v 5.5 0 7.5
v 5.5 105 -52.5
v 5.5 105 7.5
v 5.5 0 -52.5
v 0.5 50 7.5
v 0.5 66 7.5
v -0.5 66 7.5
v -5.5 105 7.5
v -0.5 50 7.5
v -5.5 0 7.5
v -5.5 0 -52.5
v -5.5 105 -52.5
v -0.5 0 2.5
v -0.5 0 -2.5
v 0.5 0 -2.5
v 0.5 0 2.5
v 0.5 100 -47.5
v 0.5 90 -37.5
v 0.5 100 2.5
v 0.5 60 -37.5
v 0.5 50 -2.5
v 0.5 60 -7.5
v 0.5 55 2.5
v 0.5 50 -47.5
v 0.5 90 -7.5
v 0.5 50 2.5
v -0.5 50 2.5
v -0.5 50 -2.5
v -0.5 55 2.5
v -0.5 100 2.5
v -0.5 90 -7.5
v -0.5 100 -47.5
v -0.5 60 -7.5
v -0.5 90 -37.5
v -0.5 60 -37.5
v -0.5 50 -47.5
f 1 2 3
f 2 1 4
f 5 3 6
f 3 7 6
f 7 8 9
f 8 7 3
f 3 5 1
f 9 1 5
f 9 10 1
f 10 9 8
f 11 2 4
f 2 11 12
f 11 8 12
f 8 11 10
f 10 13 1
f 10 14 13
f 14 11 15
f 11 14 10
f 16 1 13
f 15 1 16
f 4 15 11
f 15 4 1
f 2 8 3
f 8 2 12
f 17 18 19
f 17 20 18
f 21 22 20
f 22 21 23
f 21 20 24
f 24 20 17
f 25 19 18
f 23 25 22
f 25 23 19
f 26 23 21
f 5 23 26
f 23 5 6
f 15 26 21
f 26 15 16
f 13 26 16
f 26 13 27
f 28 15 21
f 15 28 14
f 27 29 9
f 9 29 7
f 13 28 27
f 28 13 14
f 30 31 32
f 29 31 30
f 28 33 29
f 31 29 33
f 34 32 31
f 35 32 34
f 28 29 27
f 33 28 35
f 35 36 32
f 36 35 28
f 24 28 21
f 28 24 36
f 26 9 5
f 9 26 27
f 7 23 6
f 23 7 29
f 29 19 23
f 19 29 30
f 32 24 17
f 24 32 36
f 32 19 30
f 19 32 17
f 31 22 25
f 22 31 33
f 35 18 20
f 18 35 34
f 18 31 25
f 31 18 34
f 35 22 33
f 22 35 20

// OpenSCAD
// Baseline CAD geometry, with all dimensions in millimetres; +Y follows the throat and +Z is up.
// Positive modules describe air/cutting volumes; skin modules describe outer material.
// solidBody subtracts the former from the latter. The thin spawn cube spans Y=-1 to 0,
// so the generator can retain its Y=0 face and construct the inlet boundary rectangle.
// The final two calls display BOTH objects. Export each module separately as ASCII STL
// using the wrapper procedure in README; exporting this complete scene combines them.

skinThickness = 5;

throatWidth = 1;
throatLength = 50;
throatHeight = 5;

voicingHoleWidth = 1;
voicingHoleLength = 5;
voicingHoleHeight = skinThickness;
voicingHoleX = -voicingHoleWidth / 2;
voicingHoleY = throatLength;
voicingHoleZ = throatHeight / 2;

voicingEdgeLength = 10;

pressureChamberWidth = 1;
pressureChamberLength = 50;
pressureChamberHeight = 50;
pressureChamberX = -pressureChamberWidth / 2;
pressureChamberY = throatLength;
pressureChamberZ = -pressureChamberHeight + throatHeight / 2;

chamberFillerLength = 30;
chamberFillerHeight = 30;


module throatPositive() {
    translate([-throatWidth / 2, -1, -throatHeight / 2])
    cube([throatWidth, throatLength + 2, throatHeight]);
}

module throatSkin() {
    translate([-(pressureChamberWidth + skinThickness * 2) / 2, 0, pressureChamberZ - skinThickness])
    cube([pressureChamberWidth + skinThickness * 2, throatLength - 1, pressureChamberHeight + skinThickness * 2]);
}

module voicingHolePositive() {
    translate([voicingHoleX, voicingHoleY, voicingHoleZ - 1])
    cube([voicingHoleWidth, voicingHoleLength, voicingHoleHeight + 2]);
}

module voicingEdgePositive() {
    translate([voicingHoleWidth / 2, voicingHoleY + voicingHoleLength - 0.00001, throatHeight / 2])
    rotate([0, -90, 0])
    linear_extrude(height = voicingHoleWidth)
    polygon([
        [0, 0],
        [skinThickness + 0.00001, 0],
        [skinThickness + 0.00001, voicingEdgeLength + 1]
    ]);
}

module pressureChamberPositive() {
    translate([pressureChamberX, pressureChamberY, pressureChamberZ])
    cube([pressureChamberWidth, pressureChamberLength, pressureChamberHeight]);
}

module pressureChamberSkin() {
    translate([pressureChamberX - skinThickness, pressureChamberY - skinThickness, pressureChamberZ - skinThickness])
    cube([pressureChamberWidth + skinThickness * 2, pressureChamberLength + skinThickness * 2, pressureChamberHeight + skinThickness * 2]);
}

module positiveGroup() {
    union() {
        throatPositive();
        voicingHolePositive();
        voicingEdgePositive();
        pressureChamberPositive();
    }
}

module skinGroup() {
    union() {
        throatSkin();
        pressureChamberSkin();
    }
}

module solidBody() {
    difference() {
        skinGroup();
        positiveGroup();
    }
    
    translate([pressureChamberX - skinThickness, pressureChamberY + pressureChamberLength / 2 - chamberFillerLength / 2, pressureChamberZ + pressureChamberHeight / 2 - chamberFillerHeight / 2])
    cube([pressureChamberWidth + skinThickness * 2, chamberFillerLength, chamberFillerHeight]);
    
}

module spawnPlane() {
    translate([-throatWidth / 2, -1, -throatHeight / 2])
    cube([throatWidth, 1, throatHeight]);
}

difference() {
solidBody();
//translate([0, -500, -500]) cube([1000, 1000, 1000]);
}
*spawnPlane();
